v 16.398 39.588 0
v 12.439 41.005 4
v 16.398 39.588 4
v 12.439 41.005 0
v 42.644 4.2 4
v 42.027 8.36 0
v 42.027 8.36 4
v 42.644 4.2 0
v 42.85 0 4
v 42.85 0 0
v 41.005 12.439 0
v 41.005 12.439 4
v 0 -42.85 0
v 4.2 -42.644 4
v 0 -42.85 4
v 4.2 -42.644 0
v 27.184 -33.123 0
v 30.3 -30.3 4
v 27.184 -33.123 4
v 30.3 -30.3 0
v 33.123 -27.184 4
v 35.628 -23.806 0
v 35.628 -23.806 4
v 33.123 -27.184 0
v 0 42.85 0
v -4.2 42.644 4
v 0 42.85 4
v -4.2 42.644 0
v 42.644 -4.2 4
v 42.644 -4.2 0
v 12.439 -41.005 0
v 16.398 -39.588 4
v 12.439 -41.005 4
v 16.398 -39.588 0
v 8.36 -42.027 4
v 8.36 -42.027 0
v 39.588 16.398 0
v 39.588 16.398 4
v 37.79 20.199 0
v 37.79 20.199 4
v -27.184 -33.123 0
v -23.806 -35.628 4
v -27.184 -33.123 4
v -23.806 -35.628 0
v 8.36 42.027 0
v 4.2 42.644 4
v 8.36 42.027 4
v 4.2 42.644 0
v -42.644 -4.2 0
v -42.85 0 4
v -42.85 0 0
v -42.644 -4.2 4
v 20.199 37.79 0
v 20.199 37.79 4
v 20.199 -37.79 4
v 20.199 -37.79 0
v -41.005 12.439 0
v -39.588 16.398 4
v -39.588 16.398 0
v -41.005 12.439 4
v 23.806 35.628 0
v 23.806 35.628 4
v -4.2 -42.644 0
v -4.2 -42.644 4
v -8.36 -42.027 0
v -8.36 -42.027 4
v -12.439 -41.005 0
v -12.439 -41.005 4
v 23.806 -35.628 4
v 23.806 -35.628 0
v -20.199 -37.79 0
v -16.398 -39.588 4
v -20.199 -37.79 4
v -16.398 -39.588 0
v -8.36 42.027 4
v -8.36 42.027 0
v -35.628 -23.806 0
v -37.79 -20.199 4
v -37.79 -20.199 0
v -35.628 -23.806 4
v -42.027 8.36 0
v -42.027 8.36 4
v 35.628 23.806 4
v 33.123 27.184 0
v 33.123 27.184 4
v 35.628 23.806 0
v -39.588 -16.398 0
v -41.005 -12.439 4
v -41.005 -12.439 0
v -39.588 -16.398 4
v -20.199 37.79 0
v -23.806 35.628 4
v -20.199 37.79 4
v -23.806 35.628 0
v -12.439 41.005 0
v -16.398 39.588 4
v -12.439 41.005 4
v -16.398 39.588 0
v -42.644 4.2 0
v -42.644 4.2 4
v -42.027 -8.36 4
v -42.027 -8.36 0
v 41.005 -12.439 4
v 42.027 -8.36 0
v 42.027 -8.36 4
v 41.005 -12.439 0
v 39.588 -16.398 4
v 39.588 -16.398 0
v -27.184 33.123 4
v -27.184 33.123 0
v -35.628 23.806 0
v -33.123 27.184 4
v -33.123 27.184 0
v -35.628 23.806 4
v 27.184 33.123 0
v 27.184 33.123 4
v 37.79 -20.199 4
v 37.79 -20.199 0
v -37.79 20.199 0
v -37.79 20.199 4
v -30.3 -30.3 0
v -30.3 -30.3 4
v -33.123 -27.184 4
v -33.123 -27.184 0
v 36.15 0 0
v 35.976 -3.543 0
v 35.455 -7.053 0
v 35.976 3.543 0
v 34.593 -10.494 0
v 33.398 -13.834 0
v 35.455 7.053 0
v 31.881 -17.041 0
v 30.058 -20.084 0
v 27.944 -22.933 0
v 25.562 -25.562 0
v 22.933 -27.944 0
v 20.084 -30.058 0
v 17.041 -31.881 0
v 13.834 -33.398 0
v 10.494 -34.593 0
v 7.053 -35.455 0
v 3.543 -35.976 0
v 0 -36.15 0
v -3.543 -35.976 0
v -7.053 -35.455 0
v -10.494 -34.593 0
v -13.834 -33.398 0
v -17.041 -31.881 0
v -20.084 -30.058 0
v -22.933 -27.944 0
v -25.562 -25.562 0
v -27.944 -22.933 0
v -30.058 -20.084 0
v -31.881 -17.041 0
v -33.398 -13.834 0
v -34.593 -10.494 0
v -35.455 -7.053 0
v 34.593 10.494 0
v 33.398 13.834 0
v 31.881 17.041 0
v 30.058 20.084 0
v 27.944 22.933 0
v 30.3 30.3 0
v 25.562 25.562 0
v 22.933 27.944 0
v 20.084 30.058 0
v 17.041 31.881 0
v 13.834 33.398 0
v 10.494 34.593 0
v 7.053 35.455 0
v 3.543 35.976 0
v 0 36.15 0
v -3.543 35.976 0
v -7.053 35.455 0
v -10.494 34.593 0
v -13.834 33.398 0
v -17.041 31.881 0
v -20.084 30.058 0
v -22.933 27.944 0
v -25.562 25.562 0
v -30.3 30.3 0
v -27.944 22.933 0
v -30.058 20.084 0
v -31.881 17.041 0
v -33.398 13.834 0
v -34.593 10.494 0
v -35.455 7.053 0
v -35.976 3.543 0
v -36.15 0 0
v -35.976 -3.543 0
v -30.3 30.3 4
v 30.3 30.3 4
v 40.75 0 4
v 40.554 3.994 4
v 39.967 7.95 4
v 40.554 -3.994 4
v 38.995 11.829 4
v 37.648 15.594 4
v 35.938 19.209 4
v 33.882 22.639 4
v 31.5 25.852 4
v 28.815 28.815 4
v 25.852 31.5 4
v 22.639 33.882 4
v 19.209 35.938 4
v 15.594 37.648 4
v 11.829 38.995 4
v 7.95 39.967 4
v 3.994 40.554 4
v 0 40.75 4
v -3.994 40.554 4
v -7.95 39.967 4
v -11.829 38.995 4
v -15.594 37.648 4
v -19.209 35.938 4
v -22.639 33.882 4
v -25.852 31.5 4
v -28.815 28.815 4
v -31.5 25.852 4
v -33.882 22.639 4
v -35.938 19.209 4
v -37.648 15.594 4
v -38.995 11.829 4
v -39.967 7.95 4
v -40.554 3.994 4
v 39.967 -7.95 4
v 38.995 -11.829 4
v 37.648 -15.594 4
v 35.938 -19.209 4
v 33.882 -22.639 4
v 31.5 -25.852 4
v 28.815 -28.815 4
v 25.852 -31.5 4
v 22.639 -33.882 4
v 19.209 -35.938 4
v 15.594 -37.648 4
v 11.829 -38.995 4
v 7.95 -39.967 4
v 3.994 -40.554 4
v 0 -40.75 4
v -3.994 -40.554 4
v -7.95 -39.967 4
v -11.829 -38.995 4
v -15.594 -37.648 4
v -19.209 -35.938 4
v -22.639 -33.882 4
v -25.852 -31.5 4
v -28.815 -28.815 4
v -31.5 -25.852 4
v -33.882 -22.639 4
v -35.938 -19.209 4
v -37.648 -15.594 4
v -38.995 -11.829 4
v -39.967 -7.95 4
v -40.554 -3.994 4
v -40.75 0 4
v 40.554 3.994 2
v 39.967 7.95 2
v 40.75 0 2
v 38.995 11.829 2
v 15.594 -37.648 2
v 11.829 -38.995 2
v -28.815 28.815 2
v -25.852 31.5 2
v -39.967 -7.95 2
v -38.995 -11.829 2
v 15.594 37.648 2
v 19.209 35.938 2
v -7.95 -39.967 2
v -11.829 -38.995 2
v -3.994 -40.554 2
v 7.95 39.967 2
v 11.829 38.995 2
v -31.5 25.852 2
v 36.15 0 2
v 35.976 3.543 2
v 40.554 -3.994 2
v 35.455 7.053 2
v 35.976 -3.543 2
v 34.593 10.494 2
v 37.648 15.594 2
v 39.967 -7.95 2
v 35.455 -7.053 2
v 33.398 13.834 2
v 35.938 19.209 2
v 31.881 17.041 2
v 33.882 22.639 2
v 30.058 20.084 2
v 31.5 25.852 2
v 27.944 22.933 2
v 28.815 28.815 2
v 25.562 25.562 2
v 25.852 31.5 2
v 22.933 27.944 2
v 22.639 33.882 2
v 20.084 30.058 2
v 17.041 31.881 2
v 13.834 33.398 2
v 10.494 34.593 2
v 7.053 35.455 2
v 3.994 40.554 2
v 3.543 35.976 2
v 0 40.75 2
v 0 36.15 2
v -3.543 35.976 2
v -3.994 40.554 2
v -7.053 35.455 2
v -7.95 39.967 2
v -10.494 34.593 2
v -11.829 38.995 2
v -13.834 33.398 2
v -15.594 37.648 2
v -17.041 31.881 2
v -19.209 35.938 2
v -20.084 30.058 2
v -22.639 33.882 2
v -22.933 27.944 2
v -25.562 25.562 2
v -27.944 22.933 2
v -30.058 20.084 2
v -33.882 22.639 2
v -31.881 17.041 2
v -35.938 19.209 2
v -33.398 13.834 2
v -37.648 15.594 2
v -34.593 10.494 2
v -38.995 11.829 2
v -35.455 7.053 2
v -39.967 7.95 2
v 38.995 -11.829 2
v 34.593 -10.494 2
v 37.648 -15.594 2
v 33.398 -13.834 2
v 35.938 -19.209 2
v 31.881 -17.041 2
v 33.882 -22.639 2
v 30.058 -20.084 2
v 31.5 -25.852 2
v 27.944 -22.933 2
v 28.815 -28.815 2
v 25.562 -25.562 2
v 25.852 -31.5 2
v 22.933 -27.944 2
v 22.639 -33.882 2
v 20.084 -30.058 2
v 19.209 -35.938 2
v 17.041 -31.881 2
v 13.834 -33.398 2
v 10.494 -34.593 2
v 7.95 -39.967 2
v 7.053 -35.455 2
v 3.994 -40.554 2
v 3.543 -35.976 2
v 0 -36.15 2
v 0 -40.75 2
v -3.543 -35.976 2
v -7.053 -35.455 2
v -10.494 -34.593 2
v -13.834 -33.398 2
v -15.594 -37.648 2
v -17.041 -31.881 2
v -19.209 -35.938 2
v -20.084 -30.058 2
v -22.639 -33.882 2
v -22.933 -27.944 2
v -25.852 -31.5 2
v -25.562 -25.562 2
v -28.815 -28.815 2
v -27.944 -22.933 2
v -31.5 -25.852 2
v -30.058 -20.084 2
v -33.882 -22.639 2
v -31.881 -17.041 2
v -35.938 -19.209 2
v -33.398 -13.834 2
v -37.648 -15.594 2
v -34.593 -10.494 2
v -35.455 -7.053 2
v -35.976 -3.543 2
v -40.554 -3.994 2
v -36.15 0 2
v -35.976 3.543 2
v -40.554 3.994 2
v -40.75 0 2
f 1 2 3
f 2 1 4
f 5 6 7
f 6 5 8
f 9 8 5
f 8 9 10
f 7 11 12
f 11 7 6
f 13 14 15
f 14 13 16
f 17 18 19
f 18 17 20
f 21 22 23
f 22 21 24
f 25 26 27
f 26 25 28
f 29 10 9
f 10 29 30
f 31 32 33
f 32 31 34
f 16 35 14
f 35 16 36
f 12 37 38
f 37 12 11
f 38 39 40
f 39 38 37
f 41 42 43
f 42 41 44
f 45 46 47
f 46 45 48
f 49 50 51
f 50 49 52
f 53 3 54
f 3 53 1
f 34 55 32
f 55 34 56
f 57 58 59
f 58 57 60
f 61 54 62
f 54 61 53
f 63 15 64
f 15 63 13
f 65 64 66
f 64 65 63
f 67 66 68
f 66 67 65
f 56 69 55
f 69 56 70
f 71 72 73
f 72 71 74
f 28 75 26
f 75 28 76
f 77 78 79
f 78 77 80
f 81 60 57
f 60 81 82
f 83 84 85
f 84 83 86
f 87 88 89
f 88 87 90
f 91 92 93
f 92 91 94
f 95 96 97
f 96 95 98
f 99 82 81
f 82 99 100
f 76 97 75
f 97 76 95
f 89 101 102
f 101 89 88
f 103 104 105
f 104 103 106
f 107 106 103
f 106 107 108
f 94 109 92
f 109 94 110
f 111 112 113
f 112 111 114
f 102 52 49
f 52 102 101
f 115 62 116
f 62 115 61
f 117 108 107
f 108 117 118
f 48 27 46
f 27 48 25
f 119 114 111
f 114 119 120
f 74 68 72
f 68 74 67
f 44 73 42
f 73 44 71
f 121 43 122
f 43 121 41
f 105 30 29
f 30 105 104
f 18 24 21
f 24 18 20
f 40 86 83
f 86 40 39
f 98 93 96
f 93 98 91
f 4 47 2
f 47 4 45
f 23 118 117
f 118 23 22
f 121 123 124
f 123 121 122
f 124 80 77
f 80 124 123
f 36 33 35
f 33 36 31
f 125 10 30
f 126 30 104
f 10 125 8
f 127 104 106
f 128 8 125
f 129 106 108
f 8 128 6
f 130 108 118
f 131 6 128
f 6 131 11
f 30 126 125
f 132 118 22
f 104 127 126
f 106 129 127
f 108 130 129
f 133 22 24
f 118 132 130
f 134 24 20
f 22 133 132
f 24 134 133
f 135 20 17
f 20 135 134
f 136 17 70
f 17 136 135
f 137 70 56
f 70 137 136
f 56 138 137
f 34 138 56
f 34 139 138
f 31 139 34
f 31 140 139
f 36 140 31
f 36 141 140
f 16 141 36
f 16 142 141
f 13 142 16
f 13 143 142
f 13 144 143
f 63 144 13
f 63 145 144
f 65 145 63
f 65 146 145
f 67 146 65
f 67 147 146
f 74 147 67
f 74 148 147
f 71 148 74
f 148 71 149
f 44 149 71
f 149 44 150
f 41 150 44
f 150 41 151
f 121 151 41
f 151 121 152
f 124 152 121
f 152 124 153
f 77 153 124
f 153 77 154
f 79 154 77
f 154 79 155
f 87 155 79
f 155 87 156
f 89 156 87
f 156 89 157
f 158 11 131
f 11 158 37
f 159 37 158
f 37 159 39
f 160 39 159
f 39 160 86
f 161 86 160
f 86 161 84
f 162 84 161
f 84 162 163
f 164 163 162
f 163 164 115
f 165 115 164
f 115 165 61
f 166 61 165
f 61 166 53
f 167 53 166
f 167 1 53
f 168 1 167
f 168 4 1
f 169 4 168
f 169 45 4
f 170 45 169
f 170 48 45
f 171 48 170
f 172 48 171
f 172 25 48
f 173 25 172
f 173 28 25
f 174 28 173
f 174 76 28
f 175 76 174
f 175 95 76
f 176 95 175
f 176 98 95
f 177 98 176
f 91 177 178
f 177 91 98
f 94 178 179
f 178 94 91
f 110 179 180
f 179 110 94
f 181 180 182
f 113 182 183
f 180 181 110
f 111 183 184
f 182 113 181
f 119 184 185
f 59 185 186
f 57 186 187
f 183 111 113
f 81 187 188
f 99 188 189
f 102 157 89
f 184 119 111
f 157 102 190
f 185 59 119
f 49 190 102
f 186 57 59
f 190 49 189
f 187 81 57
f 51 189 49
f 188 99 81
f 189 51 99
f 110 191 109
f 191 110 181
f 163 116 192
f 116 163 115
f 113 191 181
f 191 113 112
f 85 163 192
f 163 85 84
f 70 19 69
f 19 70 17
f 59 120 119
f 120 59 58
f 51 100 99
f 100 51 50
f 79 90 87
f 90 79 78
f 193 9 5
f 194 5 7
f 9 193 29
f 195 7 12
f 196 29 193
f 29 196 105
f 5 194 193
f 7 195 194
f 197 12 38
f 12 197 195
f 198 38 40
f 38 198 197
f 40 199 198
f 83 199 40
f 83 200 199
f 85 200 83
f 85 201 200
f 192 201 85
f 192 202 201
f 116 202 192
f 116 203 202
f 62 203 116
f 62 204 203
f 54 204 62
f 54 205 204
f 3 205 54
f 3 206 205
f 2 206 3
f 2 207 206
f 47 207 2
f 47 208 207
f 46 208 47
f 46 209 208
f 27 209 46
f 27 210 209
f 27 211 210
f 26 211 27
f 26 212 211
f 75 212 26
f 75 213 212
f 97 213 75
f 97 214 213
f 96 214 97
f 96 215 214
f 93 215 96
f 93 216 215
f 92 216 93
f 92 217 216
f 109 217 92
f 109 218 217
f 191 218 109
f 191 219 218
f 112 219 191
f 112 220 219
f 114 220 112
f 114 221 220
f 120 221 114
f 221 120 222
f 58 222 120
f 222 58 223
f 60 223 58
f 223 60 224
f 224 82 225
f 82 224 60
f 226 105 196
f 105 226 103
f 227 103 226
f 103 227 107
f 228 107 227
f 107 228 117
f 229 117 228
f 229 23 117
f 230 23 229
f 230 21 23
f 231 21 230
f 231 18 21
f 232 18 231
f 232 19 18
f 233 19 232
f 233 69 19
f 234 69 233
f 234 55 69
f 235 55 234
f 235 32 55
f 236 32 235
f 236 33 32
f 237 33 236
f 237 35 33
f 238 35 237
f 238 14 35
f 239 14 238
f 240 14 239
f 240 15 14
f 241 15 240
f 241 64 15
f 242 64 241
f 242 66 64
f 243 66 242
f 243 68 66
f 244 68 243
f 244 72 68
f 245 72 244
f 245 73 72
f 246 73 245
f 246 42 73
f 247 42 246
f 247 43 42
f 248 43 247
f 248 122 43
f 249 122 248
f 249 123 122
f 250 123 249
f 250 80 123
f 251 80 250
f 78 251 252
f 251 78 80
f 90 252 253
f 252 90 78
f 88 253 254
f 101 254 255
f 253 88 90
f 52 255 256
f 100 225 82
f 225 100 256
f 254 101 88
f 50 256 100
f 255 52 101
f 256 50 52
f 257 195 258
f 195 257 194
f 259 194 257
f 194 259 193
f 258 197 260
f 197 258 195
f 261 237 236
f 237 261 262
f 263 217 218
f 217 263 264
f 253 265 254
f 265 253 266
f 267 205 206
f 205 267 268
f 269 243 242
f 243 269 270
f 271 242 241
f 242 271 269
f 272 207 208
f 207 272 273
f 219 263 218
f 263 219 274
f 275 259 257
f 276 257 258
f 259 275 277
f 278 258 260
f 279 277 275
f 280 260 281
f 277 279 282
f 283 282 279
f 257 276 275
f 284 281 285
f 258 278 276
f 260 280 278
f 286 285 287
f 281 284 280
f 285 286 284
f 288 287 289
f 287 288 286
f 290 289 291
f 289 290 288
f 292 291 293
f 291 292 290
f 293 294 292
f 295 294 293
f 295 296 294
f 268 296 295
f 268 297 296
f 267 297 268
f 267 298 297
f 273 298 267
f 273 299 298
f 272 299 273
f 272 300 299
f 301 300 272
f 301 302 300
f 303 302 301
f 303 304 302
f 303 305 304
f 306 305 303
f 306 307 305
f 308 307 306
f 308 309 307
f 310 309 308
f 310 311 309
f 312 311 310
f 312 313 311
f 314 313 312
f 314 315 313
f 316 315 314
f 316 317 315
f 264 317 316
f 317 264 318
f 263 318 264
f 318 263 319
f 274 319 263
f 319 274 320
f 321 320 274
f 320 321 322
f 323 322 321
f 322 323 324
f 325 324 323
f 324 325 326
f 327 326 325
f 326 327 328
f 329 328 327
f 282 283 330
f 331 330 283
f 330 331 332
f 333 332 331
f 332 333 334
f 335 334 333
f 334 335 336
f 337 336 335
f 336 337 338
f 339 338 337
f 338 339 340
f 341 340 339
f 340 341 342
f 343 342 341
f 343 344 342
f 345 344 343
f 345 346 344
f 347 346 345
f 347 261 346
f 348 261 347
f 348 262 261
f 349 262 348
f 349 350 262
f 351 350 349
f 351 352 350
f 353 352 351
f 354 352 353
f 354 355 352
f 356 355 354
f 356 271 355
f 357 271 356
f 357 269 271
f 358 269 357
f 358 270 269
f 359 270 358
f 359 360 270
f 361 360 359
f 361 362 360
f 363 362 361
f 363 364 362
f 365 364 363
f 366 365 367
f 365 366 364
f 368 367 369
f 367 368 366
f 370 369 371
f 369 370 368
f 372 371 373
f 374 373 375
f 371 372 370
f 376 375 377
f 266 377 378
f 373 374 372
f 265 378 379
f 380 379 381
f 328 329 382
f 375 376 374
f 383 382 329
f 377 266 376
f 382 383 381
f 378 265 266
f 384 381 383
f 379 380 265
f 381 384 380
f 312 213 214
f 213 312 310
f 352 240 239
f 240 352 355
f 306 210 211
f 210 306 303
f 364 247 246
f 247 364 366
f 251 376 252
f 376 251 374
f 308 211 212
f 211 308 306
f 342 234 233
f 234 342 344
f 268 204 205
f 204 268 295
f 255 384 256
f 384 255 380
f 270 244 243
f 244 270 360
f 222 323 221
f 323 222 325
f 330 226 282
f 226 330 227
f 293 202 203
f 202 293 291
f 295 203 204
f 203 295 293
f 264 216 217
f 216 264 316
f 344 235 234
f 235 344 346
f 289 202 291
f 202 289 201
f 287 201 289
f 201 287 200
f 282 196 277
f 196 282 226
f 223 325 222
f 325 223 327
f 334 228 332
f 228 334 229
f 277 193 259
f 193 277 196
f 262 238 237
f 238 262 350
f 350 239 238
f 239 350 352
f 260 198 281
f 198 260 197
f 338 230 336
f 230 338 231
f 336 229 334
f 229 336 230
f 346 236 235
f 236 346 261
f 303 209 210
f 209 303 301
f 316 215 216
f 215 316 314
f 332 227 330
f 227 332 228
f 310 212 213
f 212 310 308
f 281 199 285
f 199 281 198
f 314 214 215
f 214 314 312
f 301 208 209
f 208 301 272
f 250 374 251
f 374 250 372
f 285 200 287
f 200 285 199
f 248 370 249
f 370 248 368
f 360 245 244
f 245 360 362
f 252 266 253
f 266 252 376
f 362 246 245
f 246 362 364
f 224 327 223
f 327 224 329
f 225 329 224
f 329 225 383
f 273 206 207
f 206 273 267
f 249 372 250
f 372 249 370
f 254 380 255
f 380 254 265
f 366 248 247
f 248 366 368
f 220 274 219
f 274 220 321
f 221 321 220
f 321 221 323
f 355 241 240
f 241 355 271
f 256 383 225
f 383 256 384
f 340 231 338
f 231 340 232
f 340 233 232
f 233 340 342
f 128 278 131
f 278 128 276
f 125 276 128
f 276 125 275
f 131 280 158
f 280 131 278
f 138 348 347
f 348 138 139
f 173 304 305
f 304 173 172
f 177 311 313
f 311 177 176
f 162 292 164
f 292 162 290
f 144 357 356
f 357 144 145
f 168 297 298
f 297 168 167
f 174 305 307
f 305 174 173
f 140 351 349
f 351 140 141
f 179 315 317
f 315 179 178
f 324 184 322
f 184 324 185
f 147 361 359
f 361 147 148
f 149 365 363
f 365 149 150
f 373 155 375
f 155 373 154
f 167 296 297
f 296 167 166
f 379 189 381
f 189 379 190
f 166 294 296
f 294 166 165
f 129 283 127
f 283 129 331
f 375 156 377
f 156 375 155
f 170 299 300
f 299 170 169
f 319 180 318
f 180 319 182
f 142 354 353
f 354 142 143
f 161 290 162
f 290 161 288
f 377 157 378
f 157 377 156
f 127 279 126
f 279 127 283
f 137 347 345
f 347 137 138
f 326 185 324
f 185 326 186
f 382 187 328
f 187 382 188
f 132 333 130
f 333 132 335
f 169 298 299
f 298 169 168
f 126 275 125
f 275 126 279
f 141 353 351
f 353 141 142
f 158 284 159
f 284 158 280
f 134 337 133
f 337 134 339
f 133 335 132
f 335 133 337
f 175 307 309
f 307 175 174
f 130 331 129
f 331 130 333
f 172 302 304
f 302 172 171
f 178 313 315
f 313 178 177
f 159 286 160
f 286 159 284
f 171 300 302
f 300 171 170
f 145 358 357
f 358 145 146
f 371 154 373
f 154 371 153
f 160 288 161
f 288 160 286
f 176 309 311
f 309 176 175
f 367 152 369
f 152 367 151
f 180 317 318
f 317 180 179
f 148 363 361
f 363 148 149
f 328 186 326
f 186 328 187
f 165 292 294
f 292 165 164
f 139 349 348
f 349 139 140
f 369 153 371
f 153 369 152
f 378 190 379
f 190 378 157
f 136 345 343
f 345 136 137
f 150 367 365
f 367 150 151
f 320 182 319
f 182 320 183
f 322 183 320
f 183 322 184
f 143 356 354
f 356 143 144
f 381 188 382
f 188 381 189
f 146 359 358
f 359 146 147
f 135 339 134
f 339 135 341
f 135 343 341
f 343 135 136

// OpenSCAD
glass_h = 10;
glass_r = 40.75;

outer_shell_h = 4;
outer_shell_r = glass_r + 2.1;

inner_opening_h = glass_h;
glass_overhand = 4.6;
inner_opening_r = glass_r - glass_overhand;

roundness = 64;

difference() {
    cylinder(h = outer_shell_h, r = outer_shell_r, $fn = roundness);
    translate([0, 0, 2]) {
        cylinder(h = glass_h, r = glass_r, $fn = roundness);
    }
    cylinder(h = inner_opening_h, r = inner_opening_r, $fn = roundness);
}
